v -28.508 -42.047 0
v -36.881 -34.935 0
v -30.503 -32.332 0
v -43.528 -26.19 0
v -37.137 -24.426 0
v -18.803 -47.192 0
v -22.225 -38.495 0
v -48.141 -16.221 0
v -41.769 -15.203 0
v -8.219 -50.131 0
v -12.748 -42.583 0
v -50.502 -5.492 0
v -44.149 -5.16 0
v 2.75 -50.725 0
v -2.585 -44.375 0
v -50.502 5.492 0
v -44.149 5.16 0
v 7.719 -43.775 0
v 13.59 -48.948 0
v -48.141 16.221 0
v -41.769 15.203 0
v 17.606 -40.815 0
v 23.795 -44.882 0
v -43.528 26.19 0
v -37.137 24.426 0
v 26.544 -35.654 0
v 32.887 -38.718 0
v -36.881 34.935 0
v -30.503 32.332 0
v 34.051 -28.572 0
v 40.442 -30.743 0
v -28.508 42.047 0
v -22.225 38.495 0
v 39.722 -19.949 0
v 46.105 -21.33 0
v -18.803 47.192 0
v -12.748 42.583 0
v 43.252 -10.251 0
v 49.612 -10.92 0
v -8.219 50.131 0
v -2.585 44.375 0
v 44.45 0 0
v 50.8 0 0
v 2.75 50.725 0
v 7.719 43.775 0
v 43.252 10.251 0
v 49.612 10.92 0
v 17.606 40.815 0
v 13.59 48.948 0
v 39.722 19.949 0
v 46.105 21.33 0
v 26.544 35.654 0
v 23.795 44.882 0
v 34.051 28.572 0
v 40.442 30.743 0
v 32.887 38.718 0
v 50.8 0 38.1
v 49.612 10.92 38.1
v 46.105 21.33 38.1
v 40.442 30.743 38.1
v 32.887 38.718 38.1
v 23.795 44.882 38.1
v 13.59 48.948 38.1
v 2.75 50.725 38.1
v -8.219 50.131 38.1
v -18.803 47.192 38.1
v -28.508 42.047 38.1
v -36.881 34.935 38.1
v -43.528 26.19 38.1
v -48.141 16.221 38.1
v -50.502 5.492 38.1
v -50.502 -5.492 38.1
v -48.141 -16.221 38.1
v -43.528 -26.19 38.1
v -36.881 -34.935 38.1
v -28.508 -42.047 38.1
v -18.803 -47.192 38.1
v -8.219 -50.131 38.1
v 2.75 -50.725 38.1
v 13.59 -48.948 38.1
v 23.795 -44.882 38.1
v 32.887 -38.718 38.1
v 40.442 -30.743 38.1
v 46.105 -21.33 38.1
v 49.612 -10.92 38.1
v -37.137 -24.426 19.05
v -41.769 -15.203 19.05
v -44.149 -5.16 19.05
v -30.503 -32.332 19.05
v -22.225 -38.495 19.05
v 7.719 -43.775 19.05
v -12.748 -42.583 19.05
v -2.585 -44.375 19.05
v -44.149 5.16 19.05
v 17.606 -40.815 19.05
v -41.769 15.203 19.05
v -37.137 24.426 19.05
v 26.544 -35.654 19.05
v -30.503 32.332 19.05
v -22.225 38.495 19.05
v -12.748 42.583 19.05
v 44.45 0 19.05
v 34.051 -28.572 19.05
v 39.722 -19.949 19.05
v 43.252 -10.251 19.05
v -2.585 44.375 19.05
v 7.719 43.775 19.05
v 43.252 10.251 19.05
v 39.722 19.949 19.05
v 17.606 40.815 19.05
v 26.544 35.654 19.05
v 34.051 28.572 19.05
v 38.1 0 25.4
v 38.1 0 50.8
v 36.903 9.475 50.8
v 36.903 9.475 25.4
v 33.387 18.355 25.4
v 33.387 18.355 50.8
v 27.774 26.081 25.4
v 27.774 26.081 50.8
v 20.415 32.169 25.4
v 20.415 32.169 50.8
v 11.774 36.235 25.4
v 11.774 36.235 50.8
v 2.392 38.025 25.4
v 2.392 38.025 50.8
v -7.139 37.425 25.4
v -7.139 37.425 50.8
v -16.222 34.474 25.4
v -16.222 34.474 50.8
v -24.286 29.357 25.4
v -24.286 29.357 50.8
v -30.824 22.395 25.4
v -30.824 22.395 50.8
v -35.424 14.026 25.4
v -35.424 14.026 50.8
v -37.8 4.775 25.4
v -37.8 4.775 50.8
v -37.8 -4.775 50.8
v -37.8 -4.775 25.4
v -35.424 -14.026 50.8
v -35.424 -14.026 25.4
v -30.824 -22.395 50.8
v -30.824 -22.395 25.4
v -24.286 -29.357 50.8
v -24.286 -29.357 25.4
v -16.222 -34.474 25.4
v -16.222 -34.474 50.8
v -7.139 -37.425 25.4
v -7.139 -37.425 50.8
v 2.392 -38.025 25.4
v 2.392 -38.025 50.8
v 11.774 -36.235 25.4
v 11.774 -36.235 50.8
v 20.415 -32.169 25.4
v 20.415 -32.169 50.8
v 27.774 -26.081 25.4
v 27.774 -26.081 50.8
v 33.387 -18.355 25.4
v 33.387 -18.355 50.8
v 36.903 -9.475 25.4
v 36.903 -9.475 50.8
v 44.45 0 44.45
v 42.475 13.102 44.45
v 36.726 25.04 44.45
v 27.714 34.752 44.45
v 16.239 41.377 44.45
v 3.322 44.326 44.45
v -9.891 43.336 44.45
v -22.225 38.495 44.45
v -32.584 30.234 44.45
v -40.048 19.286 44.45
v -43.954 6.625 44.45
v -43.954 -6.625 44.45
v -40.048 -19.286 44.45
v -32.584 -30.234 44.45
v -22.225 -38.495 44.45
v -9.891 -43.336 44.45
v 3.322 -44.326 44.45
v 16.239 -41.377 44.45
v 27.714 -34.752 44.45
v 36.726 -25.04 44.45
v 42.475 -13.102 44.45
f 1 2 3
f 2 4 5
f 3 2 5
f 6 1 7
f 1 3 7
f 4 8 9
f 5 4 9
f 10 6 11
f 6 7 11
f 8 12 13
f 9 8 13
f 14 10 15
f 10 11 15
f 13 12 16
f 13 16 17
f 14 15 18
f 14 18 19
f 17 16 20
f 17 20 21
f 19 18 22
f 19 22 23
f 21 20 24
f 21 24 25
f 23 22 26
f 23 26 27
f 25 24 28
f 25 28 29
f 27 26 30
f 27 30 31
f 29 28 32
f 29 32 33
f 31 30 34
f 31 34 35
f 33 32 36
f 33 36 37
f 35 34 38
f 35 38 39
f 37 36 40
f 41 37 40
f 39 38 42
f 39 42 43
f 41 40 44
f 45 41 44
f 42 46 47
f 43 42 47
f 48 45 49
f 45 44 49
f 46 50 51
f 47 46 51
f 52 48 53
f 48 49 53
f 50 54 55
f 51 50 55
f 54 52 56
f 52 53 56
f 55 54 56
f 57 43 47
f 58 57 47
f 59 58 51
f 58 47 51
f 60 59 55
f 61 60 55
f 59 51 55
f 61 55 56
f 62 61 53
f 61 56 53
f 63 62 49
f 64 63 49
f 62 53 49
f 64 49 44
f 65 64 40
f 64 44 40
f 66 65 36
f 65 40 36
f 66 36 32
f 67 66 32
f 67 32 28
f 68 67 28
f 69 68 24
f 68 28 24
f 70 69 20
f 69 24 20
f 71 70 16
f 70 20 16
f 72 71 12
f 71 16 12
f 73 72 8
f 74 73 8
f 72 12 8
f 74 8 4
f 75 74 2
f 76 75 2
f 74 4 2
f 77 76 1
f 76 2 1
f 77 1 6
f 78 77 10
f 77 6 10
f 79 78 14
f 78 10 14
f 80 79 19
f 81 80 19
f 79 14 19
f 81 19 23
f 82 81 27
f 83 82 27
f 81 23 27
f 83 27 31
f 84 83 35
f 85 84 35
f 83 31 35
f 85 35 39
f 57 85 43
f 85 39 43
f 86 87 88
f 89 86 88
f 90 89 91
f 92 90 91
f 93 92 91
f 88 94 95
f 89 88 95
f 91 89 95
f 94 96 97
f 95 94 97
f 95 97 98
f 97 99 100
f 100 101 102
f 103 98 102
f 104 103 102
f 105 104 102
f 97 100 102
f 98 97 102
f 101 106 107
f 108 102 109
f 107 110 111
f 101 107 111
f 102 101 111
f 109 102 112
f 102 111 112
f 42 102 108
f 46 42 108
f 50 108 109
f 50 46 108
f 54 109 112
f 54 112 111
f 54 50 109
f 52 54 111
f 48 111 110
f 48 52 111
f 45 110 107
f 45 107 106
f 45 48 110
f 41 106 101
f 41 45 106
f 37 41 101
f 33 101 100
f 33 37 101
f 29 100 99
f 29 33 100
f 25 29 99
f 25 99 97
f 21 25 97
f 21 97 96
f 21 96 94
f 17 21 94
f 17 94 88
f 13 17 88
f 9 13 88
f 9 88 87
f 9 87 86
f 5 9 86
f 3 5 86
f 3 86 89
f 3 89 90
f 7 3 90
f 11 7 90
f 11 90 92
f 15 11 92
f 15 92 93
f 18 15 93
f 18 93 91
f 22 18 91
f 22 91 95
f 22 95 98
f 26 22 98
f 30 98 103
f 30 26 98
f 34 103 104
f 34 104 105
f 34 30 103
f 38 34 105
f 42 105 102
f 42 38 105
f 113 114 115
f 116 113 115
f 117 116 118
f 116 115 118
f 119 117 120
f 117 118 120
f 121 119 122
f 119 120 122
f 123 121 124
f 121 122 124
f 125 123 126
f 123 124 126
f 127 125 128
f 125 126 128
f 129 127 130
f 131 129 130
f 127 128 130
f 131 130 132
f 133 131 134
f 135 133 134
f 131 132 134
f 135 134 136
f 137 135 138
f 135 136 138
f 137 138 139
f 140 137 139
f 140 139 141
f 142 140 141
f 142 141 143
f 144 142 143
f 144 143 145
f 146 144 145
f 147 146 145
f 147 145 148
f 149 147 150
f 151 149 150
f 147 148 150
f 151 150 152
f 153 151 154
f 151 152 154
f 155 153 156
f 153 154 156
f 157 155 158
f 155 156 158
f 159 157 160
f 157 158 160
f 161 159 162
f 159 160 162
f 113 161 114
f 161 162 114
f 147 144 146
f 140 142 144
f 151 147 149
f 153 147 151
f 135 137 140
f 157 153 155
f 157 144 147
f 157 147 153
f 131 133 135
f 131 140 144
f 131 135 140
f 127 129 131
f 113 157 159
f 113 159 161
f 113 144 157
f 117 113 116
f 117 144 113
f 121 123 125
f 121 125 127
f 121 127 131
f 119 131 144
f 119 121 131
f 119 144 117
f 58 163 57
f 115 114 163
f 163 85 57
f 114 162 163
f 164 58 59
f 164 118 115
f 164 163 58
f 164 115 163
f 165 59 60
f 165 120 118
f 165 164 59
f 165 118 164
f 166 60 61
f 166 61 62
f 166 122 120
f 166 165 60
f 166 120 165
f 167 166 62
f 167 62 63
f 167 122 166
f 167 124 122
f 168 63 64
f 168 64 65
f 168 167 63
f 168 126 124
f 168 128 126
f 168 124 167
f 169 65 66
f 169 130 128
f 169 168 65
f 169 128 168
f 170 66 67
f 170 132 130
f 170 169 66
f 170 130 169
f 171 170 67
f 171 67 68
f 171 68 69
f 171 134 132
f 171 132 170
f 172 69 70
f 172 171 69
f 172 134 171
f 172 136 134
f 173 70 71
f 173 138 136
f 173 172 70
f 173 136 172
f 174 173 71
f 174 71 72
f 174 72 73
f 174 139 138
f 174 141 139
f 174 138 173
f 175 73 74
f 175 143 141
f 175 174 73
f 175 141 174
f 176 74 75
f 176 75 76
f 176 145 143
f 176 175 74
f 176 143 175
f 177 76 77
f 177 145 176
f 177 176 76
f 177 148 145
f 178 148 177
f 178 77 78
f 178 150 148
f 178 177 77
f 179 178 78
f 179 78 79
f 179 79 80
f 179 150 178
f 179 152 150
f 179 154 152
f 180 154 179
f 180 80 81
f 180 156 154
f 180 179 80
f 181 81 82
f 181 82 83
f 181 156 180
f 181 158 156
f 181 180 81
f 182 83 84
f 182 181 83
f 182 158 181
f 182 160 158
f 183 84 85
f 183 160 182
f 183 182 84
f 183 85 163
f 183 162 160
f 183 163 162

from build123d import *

# Parameters (mm, degrees)
F0_R     = 50.8
F1_DEPTH = 50.8
F2_SIZE  = 12.7
F3_DEPTH = 25.4
F4_T     = 6.35


# Not quite as in the source:
# - a shell that OpenCascade refuses in one call is made with other operations: the cavity is built on its own and cut out


with BuildPart() as f1:
    # F0 (on Top) → F1 (new body)
    with BuildSketch(Plane.XY):
        Circle(F0_R)
    extrude(amount=F1_DEPTH)

    # F2
    f2_edges = [f1.edges().sort_by_distance(p)[0] for p in [
        (-50.8, 0, 50.8),
    ]]
    chamfer(f2_edges, length=F2_SIZE)

    # F3 (cut): a face of the model
    f3_faces = [f1.faces().sort_by_distance(p)[0] for p in [
        (0, 0, 50.8),
    ]]
    extrude(f3_faces, amount=-F3_DEPTH, mode=Mode.SUBTRACT)

    # F4: shell of thickness 6.35, made by hand


with BuildPart() as f4_core1:
    # F4_t2: copy of F1
    add(f1.part)

    # the walls: a layer under each face that stays
    f4_faces = [f4_core1.faces().sort_by_distance(p)[0] for p in [
        (-50.8, 0, 19.05),
        (-44.45, 0, 44.45),
        (-38.1, 0, 38.1),
        (0, 0, 25.4),
    ]]
    thicken(f4_faces, amount=-F4_T, mode=Mode.SUBTRACT)

    # F4_s3 → F4_t4 (revolve, cut)
    with BuildSketch(Plane.XZ):
        Polygon((38.0365, 25.4635), (44.45, 25.4), (44.45, 19.05), (38.1, 19.05), align=None)
    revolve(axis=Axis((0, 0, 25.4), (0, 0, 1)), mode=Mode.SUBTRACT)


with BuildPart() as f1_1:
    add(f1.part)

    # what is left inside the walls is the cavity
    f4_cavity = [f4_core1.part.solids().sort_by_distance(p)[0] for p in [
        (0, -14.816667, 18.9865),
    ]]
    add(f4_cavity, mode=Mode.SUBTRACT)


solid = f1_1.part
